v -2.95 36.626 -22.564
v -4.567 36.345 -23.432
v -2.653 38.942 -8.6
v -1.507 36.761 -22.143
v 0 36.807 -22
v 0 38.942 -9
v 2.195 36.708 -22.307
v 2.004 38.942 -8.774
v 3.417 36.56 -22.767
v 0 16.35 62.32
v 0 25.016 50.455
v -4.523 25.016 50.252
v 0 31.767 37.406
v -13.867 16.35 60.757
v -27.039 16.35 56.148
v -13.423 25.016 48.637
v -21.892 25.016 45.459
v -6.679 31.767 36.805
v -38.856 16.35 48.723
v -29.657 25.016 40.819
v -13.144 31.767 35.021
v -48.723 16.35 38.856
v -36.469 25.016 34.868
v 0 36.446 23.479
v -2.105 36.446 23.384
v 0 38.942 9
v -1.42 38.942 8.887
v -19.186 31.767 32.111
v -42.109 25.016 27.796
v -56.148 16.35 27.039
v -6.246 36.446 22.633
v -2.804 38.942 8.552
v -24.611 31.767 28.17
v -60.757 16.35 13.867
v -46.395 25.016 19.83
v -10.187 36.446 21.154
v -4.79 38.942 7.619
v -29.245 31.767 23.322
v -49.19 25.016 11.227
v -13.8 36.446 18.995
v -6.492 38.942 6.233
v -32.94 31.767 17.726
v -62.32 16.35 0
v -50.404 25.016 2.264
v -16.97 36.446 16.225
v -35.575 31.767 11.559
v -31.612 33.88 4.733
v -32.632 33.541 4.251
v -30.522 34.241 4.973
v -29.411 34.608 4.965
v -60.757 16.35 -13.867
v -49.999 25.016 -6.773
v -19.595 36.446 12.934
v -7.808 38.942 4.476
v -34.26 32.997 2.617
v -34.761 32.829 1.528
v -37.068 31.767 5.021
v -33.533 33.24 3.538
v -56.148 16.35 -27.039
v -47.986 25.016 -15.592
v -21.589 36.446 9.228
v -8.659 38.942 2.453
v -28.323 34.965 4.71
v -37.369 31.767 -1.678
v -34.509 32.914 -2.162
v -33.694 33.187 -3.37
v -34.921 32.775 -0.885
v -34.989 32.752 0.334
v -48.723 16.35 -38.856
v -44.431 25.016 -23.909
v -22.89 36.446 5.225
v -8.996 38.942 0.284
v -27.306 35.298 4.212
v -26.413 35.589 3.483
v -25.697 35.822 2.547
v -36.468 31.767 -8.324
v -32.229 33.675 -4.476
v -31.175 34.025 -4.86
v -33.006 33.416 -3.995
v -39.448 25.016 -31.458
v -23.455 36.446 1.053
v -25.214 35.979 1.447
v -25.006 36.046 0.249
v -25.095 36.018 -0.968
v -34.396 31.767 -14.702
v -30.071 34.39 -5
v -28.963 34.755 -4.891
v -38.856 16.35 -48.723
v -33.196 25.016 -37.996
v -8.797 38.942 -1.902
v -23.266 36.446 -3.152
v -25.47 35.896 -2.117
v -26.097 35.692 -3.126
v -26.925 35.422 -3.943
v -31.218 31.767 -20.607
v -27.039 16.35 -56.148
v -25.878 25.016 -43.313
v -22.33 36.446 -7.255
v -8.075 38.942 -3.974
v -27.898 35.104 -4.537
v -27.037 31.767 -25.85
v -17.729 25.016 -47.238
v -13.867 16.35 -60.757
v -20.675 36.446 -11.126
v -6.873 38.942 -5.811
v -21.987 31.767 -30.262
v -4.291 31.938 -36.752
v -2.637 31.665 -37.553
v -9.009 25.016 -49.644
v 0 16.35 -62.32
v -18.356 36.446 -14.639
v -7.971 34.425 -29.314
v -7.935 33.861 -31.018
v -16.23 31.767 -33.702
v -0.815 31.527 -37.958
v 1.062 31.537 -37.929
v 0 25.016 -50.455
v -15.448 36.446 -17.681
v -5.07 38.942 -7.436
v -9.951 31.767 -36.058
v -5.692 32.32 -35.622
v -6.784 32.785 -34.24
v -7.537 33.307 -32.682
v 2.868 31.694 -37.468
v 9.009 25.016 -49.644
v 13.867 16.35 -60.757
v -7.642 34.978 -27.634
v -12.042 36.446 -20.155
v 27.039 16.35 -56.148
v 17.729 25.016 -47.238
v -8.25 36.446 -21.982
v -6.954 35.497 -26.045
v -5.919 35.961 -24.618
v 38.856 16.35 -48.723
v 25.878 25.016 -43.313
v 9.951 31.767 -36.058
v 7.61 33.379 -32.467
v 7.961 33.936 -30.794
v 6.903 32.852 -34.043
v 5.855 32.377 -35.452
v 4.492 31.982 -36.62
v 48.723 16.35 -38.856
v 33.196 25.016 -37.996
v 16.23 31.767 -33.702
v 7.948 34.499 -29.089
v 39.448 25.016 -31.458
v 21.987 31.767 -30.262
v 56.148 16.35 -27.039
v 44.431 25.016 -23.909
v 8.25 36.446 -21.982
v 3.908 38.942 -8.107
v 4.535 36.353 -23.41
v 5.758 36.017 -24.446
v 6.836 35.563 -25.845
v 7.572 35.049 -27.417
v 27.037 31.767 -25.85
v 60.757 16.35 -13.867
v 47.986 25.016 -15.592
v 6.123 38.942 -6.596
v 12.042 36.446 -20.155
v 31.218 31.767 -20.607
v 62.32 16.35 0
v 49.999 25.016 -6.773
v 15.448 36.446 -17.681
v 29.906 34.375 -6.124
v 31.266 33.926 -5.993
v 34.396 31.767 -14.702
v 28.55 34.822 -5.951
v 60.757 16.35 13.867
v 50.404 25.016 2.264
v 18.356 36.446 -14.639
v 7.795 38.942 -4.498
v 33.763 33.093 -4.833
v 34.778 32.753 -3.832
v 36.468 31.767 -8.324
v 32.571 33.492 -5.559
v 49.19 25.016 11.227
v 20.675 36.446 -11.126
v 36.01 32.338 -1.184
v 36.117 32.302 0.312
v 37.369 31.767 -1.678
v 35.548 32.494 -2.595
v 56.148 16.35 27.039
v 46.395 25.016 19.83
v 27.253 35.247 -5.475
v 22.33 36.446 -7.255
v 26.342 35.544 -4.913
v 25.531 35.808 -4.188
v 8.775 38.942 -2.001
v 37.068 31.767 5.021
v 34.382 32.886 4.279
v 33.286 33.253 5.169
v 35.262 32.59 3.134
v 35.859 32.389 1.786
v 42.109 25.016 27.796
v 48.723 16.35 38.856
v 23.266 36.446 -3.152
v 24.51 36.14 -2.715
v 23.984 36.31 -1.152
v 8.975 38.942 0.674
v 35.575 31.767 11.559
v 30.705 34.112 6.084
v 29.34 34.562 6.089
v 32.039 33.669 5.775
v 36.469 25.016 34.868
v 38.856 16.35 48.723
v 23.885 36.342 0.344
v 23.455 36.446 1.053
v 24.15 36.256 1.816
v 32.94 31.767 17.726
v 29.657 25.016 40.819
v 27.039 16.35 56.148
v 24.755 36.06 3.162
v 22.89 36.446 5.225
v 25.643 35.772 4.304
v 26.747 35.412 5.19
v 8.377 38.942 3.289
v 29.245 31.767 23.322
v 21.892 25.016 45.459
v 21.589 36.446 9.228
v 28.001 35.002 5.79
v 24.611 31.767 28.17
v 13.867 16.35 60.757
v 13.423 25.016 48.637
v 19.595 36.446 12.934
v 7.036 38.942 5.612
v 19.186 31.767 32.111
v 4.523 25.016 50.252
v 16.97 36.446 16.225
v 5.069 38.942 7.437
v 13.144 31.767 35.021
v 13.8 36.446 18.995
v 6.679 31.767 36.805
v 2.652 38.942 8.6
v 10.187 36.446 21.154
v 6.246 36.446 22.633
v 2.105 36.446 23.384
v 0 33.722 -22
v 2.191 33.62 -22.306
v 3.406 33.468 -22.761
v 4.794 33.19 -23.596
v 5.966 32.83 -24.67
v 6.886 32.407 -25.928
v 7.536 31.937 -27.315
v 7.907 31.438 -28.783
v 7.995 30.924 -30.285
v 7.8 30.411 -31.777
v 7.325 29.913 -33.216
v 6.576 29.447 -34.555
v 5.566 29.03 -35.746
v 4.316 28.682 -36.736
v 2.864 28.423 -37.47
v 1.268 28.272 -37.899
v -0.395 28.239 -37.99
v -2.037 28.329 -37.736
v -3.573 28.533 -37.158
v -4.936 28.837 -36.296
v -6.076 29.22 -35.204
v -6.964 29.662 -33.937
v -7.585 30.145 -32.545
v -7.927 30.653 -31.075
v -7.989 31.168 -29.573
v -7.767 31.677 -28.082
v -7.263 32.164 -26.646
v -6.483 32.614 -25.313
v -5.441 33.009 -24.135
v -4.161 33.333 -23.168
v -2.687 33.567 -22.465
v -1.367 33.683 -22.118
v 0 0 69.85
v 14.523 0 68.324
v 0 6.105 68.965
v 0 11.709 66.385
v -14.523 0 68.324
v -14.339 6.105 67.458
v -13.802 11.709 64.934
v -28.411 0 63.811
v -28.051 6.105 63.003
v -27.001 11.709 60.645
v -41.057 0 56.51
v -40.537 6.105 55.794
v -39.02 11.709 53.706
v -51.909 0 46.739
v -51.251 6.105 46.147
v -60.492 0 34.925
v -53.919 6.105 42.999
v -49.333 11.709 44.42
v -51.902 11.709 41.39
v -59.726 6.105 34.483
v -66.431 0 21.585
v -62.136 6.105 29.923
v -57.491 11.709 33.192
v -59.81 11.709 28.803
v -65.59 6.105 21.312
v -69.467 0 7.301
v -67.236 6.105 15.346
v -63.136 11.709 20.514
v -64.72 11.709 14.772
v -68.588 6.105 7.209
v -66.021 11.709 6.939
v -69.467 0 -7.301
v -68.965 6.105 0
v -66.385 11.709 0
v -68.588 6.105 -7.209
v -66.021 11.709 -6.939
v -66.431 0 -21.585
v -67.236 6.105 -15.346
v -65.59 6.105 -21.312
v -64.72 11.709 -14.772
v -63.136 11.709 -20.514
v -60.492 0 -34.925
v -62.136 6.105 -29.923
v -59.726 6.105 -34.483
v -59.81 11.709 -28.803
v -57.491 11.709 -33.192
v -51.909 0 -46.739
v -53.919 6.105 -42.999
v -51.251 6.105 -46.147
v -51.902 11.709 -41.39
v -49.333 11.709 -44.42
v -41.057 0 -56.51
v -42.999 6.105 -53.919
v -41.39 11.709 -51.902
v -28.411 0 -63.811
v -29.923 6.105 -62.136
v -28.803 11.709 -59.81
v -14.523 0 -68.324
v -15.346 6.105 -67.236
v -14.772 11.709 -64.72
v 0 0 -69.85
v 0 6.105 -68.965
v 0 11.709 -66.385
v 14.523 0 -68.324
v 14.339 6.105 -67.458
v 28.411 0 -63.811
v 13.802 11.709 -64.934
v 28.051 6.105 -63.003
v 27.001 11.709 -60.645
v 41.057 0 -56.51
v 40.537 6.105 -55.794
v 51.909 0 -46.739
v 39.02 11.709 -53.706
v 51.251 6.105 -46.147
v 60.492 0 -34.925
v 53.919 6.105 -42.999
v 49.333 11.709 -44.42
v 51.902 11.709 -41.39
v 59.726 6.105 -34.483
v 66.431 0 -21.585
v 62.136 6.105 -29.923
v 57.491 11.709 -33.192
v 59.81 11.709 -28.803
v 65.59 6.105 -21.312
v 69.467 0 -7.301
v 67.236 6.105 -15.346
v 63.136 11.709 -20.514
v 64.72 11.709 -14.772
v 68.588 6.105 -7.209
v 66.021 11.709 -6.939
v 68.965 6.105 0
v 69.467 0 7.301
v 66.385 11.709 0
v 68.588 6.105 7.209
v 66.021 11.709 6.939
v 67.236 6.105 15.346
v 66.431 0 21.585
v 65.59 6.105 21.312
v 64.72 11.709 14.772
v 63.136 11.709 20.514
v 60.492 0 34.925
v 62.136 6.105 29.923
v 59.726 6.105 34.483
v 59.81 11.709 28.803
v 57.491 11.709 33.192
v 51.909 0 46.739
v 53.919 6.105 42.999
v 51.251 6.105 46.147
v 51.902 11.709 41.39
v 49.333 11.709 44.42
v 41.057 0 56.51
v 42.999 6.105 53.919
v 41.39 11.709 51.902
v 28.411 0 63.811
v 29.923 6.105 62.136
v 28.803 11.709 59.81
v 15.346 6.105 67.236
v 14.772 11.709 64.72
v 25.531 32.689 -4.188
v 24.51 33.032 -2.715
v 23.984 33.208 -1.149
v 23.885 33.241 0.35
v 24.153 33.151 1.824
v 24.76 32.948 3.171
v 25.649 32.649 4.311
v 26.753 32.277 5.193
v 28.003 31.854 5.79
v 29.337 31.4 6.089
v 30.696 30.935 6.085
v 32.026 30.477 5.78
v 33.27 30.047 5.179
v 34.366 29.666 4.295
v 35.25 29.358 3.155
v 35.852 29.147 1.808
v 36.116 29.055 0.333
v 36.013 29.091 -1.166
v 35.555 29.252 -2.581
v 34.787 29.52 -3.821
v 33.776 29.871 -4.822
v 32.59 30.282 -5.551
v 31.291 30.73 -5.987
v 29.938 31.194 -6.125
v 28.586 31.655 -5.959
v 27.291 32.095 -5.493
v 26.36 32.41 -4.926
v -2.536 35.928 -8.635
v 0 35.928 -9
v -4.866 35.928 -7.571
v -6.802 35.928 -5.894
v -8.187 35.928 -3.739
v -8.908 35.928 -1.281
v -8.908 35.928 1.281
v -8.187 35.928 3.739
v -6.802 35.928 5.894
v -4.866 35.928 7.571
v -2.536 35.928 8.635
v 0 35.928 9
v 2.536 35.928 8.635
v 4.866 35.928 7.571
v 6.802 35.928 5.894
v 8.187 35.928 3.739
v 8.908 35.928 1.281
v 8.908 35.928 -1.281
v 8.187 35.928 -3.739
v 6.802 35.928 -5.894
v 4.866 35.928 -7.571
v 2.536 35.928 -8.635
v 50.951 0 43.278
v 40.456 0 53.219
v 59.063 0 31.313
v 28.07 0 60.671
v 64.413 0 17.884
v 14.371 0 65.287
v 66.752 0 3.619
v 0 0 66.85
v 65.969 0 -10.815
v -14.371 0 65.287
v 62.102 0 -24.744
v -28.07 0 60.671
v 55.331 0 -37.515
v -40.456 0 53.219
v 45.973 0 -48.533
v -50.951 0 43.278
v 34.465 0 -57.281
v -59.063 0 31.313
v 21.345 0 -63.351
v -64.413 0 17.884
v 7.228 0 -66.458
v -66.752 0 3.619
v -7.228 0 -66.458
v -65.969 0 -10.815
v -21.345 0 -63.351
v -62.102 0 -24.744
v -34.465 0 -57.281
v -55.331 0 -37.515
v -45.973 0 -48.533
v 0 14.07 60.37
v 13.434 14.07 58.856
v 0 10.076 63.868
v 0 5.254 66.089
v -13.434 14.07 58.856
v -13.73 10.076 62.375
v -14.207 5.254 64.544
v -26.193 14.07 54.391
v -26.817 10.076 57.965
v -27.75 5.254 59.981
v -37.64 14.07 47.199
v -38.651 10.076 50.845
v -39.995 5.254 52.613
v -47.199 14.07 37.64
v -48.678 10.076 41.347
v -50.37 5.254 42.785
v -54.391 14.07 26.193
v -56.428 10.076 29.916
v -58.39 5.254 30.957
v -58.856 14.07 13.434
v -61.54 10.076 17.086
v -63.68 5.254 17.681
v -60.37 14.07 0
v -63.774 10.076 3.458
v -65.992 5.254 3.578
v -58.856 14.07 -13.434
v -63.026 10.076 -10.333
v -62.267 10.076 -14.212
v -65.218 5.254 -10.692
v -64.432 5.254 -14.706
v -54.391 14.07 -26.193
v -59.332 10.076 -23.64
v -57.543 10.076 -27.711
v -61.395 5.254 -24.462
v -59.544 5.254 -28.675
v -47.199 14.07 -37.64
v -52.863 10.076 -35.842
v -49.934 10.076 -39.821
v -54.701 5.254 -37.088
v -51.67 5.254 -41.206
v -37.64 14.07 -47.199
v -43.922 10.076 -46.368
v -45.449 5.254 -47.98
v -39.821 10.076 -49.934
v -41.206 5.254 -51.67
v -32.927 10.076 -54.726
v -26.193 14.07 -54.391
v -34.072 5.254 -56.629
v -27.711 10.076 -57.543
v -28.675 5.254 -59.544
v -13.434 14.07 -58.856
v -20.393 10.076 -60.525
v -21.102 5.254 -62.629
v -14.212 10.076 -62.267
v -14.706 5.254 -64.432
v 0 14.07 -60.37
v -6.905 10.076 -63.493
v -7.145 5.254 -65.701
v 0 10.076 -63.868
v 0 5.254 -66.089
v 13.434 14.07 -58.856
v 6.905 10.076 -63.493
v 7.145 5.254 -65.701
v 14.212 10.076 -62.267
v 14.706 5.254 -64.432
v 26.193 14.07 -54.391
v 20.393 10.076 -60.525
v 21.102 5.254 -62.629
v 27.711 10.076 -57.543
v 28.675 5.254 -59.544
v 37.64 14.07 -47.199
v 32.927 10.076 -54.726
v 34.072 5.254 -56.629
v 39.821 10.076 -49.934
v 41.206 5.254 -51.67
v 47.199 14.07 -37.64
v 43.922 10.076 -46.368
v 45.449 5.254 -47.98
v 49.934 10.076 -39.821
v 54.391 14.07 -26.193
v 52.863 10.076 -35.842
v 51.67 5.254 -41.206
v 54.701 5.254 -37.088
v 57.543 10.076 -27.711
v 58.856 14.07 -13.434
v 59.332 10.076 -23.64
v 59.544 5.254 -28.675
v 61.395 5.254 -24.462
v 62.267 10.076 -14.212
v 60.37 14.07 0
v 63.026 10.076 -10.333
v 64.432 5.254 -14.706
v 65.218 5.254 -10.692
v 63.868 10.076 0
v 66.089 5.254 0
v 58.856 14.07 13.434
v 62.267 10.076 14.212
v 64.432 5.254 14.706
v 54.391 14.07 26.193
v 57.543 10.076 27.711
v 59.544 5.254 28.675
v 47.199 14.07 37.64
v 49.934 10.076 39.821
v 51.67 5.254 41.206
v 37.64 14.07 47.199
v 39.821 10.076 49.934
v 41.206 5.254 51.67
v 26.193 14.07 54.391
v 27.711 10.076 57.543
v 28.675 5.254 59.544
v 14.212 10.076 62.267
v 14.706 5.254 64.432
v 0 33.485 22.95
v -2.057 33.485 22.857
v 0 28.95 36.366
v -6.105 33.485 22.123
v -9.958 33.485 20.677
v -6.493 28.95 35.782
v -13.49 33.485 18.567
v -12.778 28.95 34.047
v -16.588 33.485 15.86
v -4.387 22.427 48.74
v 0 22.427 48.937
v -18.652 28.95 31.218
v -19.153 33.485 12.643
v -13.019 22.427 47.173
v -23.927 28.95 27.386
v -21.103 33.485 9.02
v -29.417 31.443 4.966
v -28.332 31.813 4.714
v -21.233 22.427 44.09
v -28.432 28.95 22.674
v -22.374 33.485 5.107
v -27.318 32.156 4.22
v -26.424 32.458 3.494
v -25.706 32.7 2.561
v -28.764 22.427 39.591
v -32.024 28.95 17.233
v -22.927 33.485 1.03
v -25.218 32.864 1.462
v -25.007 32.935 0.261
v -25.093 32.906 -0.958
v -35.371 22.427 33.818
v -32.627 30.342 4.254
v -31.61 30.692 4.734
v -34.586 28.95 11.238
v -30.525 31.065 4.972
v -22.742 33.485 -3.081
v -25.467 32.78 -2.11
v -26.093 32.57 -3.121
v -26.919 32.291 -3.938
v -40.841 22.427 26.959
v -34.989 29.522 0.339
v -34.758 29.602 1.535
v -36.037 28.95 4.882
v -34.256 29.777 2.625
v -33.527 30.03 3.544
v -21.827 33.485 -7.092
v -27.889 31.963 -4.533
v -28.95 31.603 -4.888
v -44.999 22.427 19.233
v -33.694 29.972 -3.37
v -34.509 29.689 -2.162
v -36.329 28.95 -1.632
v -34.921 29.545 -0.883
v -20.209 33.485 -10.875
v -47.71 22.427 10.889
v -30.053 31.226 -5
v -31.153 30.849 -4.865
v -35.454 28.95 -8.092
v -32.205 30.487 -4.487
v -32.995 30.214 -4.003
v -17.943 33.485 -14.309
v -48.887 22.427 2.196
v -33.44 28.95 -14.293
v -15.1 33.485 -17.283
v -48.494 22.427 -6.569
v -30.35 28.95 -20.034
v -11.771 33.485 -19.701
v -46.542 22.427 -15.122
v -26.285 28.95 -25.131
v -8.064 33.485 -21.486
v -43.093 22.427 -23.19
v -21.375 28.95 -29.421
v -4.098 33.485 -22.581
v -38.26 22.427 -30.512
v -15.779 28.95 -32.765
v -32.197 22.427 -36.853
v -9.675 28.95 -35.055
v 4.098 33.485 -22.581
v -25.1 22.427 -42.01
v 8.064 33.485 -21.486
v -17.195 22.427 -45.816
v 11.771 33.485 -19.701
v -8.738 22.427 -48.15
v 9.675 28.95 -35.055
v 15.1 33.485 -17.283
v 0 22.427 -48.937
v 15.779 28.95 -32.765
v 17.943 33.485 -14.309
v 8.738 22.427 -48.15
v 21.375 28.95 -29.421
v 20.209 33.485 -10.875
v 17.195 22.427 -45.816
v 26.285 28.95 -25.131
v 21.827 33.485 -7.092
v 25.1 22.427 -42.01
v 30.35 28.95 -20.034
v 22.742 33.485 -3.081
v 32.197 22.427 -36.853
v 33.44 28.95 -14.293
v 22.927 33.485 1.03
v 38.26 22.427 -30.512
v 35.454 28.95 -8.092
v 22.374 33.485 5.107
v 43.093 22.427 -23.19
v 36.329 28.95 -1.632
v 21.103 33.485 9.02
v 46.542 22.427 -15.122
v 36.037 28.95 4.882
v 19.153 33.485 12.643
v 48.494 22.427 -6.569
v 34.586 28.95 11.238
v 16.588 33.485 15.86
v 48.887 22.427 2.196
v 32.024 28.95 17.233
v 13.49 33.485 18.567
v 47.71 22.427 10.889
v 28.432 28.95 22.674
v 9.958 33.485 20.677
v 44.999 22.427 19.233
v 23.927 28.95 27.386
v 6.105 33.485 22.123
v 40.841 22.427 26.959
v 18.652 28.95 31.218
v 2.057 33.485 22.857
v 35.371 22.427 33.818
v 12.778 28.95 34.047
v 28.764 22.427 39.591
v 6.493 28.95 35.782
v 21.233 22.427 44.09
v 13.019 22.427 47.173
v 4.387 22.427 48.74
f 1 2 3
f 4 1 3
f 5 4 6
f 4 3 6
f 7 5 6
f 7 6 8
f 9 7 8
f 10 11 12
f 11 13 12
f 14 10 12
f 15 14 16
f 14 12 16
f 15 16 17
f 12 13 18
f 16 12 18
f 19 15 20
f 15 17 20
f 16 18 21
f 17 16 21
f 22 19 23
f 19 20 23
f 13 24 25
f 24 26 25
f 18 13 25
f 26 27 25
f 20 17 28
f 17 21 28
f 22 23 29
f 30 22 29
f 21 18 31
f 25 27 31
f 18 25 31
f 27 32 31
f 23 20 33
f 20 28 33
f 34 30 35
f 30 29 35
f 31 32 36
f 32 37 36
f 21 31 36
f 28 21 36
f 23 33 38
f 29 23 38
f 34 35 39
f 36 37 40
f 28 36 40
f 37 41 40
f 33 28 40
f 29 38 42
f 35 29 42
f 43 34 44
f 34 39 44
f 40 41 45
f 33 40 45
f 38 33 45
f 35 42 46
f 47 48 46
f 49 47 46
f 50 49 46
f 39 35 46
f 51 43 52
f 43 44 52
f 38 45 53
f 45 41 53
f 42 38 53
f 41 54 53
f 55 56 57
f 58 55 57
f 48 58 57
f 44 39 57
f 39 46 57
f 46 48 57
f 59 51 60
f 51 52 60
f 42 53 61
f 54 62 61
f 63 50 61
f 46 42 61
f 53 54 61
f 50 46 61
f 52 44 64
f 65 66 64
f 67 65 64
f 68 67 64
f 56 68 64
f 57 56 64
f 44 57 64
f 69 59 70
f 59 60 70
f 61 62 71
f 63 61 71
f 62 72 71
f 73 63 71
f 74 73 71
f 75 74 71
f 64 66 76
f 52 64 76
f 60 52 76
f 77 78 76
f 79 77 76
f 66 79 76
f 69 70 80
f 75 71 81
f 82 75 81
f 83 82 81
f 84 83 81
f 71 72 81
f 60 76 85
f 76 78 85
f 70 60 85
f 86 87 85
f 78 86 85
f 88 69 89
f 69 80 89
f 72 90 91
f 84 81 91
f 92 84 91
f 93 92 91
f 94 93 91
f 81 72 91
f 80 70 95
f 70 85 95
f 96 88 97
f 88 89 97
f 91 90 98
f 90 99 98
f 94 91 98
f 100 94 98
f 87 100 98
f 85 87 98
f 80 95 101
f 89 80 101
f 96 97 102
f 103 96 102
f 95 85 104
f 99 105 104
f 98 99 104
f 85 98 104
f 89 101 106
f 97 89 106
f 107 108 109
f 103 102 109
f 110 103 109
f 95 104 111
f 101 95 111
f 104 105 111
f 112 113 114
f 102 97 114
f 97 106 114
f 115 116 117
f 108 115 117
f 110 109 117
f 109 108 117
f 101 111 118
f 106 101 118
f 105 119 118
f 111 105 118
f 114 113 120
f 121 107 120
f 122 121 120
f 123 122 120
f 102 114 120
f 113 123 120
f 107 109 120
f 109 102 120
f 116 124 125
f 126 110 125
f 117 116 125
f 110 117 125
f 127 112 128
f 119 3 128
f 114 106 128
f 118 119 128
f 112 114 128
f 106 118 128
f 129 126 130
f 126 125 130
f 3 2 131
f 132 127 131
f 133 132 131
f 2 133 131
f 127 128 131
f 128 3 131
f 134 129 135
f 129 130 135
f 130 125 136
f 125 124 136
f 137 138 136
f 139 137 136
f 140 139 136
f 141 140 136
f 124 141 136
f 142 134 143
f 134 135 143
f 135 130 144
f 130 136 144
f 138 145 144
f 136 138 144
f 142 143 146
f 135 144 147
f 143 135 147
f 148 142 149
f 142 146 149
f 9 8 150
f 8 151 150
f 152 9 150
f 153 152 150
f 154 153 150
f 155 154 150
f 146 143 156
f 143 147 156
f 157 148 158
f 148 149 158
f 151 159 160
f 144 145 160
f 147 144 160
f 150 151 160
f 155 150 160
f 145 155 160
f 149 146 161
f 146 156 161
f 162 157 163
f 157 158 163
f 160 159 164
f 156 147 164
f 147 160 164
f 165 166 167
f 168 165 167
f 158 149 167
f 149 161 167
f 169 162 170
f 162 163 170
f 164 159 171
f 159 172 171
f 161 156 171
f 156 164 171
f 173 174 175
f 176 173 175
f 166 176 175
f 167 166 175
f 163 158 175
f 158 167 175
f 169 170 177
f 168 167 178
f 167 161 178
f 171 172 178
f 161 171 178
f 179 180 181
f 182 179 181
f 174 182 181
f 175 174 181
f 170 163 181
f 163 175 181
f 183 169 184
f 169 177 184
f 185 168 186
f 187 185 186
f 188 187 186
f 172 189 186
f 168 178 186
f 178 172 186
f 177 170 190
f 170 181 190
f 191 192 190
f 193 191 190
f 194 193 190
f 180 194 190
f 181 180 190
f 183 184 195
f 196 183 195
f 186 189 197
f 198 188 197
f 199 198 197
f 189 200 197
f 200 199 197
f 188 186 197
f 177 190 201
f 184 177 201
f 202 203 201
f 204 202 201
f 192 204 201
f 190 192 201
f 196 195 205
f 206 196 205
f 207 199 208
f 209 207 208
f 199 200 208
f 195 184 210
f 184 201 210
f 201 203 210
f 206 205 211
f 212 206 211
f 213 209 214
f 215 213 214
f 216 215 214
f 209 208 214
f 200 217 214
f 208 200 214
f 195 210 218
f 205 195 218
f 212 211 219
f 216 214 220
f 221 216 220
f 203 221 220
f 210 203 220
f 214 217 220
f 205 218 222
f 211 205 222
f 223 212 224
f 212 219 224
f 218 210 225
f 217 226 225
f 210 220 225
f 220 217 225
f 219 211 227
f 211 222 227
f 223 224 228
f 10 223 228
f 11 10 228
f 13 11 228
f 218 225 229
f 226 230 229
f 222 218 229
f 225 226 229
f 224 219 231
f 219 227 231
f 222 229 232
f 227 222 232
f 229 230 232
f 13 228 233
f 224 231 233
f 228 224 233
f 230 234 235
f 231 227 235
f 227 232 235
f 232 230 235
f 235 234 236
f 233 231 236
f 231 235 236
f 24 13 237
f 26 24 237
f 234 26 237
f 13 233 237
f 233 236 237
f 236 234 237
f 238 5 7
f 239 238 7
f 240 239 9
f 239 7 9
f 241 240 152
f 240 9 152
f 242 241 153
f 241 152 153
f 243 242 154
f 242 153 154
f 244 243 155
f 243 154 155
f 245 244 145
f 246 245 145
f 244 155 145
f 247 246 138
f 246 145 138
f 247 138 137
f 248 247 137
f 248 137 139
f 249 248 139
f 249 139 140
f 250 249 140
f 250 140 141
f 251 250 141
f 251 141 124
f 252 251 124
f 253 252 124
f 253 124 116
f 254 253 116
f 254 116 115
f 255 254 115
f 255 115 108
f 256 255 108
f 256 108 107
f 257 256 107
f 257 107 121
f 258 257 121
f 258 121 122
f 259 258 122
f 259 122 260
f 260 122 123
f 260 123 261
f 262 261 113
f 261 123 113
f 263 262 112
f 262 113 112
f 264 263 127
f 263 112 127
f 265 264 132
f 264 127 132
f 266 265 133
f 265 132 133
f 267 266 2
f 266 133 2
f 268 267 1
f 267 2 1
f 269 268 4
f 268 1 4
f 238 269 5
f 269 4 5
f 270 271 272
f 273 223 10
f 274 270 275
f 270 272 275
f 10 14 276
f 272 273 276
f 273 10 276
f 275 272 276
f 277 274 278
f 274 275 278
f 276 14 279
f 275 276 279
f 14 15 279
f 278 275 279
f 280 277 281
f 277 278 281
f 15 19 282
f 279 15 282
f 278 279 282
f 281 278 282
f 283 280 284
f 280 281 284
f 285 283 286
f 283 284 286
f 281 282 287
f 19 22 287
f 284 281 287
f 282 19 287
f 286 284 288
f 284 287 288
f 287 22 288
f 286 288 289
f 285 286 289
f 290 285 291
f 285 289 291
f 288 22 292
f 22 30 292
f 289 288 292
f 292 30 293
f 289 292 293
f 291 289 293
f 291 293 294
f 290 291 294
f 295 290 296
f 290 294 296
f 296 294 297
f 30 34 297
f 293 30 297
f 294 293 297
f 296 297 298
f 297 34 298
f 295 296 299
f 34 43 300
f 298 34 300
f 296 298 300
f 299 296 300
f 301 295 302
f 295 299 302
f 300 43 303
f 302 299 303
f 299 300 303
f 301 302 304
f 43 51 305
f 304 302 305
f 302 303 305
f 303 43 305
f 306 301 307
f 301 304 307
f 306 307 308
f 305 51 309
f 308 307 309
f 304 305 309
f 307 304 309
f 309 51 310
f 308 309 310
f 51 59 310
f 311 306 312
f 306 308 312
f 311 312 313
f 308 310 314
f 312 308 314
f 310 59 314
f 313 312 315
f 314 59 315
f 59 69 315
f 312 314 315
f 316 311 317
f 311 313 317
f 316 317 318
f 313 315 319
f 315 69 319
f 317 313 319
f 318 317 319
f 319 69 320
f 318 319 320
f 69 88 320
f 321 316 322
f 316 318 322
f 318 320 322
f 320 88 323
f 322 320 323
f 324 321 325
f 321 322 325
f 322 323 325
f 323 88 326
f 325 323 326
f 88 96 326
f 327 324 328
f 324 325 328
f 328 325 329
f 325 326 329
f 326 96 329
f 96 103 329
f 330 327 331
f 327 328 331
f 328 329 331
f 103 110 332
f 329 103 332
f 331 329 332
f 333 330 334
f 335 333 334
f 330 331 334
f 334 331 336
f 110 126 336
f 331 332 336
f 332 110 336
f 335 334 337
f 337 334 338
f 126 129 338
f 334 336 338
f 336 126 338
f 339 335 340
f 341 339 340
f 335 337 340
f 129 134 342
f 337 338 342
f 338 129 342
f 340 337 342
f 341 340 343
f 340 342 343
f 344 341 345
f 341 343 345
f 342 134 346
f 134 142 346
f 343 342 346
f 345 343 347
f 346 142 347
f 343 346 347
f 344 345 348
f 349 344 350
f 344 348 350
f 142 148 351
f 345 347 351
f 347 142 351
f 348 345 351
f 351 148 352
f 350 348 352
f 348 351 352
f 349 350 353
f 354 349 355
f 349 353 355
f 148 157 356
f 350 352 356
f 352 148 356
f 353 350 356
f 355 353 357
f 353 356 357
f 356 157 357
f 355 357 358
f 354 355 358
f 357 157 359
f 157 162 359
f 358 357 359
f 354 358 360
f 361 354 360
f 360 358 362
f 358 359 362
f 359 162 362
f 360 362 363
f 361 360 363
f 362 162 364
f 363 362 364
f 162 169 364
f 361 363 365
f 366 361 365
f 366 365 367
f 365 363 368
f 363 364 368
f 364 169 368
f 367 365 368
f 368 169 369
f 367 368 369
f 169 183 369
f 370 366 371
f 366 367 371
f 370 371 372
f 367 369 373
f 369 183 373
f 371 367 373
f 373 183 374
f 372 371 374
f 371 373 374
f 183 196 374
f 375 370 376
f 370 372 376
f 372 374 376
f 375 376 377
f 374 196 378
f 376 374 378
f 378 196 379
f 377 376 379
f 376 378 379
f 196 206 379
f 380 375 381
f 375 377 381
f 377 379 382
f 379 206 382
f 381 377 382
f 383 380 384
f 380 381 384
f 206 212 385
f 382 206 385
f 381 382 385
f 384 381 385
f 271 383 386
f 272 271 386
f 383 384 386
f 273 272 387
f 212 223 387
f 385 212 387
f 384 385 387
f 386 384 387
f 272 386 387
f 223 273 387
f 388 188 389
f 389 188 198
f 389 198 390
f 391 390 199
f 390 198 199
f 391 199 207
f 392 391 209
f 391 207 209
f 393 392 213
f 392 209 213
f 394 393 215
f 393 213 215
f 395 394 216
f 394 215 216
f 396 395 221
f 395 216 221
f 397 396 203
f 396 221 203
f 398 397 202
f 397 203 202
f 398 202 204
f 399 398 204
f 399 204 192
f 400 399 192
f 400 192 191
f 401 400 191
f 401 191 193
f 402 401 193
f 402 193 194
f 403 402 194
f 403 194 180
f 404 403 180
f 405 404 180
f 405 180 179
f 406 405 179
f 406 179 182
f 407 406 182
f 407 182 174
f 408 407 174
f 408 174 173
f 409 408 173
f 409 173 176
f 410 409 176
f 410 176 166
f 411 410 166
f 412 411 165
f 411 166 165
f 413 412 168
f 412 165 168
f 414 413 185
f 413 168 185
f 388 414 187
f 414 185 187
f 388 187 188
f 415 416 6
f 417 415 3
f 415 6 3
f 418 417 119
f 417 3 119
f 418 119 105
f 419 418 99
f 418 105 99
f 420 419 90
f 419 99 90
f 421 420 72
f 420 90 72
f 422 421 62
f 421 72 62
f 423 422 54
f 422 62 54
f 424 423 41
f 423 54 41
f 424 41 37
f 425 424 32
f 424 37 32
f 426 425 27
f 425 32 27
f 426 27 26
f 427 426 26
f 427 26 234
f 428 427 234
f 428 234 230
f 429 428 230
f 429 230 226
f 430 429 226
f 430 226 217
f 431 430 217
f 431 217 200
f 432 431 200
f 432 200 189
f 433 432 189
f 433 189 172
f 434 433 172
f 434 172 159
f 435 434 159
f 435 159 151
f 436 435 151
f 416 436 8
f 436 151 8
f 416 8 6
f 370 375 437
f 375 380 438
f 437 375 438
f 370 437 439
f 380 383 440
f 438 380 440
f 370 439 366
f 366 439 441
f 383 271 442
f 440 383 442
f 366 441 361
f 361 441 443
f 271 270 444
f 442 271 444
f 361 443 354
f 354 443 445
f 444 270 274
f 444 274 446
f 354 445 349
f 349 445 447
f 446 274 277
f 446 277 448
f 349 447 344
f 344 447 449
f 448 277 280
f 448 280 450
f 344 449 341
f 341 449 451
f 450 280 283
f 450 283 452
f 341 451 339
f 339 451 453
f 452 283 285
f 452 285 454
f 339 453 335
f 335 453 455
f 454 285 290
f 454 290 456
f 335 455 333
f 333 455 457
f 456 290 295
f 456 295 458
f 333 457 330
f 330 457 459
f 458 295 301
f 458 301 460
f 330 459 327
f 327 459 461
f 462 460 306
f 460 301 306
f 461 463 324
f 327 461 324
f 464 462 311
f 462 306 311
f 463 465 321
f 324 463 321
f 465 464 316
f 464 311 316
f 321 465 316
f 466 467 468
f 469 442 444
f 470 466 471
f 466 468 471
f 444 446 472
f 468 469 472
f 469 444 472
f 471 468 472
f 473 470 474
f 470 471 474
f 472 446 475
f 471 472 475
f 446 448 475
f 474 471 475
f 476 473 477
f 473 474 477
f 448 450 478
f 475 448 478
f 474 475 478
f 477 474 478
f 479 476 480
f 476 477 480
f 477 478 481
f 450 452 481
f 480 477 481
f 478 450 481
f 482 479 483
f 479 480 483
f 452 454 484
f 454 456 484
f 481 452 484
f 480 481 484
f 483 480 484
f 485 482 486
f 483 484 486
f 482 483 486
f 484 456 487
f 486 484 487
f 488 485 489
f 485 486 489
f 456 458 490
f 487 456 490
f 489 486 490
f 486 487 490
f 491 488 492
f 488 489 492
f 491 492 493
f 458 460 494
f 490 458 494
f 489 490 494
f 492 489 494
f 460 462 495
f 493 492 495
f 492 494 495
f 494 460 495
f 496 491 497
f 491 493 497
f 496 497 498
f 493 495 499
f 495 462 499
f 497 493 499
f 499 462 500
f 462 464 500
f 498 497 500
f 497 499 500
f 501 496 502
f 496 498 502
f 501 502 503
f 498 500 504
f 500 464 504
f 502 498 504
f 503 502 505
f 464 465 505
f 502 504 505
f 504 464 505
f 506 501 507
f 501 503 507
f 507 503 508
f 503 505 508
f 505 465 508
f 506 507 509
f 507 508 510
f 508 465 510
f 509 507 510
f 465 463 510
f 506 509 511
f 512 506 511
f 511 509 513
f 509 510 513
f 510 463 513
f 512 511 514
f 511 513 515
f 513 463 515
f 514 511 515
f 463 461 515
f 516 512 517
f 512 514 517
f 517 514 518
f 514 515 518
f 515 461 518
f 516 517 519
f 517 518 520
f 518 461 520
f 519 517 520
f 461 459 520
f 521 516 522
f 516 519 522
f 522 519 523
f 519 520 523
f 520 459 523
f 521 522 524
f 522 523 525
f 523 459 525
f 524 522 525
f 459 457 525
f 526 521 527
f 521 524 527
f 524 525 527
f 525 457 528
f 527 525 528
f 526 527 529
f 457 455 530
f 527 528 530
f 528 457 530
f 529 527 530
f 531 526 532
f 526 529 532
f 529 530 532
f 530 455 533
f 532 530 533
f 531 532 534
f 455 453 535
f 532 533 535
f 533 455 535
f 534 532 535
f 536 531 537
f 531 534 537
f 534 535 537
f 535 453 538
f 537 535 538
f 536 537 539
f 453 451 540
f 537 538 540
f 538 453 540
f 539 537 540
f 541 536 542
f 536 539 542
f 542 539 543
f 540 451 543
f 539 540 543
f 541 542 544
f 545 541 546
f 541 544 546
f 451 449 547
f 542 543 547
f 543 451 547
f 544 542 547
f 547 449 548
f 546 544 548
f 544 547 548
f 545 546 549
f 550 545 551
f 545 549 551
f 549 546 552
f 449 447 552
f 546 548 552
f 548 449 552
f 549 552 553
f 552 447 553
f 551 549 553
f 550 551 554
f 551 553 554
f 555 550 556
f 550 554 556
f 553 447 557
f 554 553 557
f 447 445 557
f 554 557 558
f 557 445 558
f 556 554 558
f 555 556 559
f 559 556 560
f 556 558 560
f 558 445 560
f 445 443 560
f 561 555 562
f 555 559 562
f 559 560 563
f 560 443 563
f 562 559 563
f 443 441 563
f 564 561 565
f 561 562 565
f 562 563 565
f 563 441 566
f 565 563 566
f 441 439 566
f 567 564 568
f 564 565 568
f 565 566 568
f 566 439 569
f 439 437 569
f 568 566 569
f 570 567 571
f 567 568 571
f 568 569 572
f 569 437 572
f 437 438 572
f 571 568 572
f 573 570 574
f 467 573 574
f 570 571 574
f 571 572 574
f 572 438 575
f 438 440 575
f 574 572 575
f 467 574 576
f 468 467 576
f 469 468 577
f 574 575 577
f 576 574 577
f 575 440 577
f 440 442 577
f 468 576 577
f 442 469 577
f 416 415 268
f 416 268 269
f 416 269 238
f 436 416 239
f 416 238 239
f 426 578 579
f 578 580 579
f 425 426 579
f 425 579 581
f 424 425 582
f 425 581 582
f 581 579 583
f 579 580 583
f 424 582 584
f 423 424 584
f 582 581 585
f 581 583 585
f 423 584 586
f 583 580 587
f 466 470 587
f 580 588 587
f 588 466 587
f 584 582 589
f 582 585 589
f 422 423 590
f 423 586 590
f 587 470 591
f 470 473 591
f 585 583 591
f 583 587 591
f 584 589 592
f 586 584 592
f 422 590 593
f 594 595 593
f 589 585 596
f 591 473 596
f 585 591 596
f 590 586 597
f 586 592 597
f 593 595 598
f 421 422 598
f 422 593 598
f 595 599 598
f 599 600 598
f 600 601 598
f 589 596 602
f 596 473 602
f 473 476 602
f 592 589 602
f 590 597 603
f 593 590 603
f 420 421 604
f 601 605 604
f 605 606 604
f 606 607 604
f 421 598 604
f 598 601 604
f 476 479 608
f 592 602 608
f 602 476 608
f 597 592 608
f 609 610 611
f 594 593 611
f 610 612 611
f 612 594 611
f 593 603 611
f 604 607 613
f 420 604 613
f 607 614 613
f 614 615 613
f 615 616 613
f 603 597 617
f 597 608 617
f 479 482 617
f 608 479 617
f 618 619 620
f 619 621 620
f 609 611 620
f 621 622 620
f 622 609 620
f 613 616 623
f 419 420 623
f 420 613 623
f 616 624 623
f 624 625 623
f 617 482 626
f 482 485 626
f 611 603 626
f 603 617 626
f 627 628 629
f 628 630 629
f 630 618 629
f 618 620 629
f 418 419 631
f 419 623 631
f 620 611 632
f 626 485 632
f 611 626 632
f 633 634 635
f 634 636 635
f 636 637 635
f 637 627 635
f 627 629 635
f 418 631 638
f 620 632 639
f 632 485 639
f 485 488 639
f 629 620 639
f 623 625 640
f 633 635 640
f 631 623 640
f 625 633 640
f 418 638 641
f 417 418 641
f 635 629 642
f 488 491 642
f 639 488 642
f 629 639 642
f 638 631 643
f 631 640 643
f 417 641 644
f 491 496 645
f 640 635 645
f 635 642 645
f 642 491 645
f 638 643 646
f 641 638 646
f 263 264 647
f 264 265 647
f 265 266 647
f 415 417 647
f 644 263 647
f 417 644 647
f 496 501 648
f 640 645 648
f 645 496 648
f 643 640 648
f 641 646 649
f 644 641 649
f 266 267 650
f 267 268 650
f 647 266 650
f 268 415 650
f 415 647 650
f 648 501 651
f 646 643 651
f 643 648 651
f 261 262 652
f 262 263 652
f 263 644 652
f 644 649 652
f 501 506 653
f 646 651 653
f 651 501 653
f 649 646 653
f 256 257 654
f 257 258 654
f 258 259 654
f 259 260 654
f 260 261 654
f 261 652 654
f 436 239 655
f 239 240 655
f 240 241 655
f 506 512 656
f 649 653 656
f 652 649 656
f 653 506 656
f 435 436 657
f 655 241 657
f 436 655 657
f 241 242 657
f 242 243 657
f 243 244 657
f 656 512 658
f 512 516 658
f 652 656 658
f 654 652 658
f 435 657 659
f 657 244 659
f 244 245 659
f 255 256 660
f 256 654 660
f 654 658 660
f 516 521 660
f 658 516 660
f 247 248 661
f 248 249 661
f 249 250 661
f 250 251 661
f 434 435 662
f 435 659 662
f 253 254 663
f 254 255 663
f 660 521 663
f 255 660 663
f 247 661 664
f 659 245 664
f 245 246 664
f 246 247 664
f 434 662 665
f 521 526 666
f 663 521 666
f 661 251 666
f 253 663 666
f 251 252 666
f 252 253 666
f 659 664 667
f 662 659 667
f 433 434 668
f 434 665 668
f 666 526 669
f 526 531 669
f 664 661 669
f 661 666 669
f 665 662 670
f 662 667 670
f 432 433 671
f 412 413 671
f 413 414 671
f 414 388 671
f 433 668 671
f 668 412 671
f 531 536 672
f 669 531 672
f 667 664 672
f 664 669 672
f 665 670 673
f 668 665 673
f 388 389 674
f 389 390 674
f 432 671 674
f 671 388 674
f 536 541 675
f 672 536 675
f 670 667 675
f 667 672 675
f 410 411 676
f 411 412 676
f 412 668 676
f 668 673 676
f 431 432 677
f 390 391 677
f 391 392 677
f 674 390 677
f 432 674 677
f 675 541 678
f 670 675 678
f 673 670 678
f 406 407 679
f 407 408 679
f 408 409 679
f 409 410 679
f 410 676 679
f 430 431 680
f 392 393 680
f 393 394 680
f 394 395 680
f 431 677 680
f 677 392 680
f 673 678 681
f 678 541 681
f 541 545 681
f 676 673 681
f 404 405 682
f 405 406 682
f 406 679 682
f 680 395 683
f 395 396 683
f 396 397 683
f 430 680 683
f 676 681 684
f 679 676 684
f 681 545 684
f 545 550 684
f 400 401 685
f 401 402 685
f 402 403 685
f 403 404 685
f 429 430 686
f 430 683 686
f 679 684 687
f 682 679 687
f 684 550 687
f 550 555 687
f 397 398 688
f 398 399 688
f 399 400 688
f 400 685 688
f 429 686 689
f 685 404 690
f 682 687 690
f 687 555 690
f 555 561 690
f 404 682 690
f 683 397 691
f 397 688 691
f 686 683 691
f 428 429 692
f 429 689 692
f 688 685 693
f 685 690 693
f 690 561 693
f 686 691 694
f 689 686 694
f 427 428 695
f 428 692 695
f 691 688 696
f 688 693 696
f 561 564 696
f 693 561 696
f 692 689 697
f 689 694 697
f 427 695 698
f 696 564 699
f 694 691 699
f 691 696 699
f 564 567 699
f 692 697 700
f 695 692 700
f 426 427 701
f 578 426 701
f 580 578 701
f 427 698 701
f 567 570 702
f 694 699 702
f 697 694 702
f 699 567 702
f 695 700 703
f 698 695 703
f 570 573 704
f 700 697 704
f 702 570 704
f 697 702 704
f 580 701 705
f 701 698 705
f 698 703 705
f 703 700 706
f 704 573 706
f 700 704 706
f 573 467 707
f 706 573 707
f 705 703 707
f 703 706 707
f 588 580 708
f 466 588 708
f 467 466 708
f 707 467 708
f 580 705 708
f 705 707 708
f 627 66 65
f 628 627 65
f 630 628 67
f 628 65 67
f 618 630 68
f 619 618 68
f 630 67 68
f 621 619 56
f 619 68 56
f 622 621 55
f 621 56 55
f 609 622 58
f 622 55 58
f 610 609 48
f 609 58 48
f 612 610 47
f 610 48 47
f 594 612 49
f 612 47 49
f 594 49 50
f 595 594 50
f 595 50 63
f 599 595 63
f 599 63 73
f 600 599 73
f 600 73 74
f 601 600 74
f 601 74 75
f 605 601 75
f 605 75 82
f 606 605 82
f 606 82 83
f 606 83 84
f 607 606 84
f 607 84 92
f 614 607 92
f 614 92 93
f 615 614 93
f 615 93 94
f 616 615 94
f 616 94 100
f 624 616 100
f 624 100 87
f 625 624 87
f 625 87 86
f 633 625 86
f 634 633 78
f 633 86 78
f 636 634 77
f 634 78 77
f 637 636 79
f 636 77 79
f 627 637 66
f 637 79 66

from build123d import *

# Parameters (mm, degrees)
SKETCH_2_R          = 9
SKETCH_2_R_2        = 5.000000000000001
SKETCH_2_R_3        = 7.999999999999998
SKETCH_2_R_4        = 6.124999999999995
CUT_EXTRUDE_1_DEPTH = 107.33743200790742


with BuildPart() as part:
    # Эскиз1 → Повернуть1 (revolve)
    with BuildSketch(Plane.XY, mode=Mode.PRIVATE) as revolve_1_sk:
        with BuildLine():
            Line((0, 39.36501550915903), (0, 36.36501550915897))
            ThreePointArc((0, 36.36501550915897), (32.17757492953397, 30.613071103520923), (60.369714413268355, 14.069659601627245))
            ThreePointArc((60.369714413268355, 14.069659601627245), (65.15206854111862, 7.74515045998565), (66.84999999999997, 1.388e-14))
            Line((66.84999999999997, 1.388e-14), (69.85000000000002, 1.388e-14))
            ThreePointArc((69.85000000000002, 1.388e-14), (67.87693354038171, 9.000184617206603), (62.31964058940756, 16.349525366887885))
            ThreePointArc((62.31964058940756, 16.349525366887885), (33.216902285139106, 33.427284785509414), (0, 39.36501550915903))
        make_face()
    revolve(revolve_1_sk.sketch.rotate(Axis((0, 69.55204547466519, 0), (0, -1, 0)), 90), axis=Axis((0, 69.55204547466519, 0), (0, -1, 0)))

    # Эскиз2 → Вырез-Вытянуть1 (cut, through all)
    with BuildSketch(Plane(origin=(0, 39.36501550915903, 0), x_dir=(1, 0, 0), z_dir=(0, 1, 0))):
        with Locations(Location((0, 0, 0), (0, 0, 90))):
            Circle(SKETCH_2_R)
        with Locations(Location((-30, 0, 0), (0, 0, 137.62120169))):
            Circle(SKETCH_2_R_2)
        with Locations(Location((0, 30, 0), (0, 0, 269.99999999))):
            Circle(SKETCH_2_R_3)
        with Locations(Location((30, 0, 0), (0, 0, 136.859467324))):
            Circle(SKETCH_2_R_4)
    extrude(amount=-CUT_EXTRUDE_1_DEPTH, mode=Mode.SUBTRACT)


solid = part.part
